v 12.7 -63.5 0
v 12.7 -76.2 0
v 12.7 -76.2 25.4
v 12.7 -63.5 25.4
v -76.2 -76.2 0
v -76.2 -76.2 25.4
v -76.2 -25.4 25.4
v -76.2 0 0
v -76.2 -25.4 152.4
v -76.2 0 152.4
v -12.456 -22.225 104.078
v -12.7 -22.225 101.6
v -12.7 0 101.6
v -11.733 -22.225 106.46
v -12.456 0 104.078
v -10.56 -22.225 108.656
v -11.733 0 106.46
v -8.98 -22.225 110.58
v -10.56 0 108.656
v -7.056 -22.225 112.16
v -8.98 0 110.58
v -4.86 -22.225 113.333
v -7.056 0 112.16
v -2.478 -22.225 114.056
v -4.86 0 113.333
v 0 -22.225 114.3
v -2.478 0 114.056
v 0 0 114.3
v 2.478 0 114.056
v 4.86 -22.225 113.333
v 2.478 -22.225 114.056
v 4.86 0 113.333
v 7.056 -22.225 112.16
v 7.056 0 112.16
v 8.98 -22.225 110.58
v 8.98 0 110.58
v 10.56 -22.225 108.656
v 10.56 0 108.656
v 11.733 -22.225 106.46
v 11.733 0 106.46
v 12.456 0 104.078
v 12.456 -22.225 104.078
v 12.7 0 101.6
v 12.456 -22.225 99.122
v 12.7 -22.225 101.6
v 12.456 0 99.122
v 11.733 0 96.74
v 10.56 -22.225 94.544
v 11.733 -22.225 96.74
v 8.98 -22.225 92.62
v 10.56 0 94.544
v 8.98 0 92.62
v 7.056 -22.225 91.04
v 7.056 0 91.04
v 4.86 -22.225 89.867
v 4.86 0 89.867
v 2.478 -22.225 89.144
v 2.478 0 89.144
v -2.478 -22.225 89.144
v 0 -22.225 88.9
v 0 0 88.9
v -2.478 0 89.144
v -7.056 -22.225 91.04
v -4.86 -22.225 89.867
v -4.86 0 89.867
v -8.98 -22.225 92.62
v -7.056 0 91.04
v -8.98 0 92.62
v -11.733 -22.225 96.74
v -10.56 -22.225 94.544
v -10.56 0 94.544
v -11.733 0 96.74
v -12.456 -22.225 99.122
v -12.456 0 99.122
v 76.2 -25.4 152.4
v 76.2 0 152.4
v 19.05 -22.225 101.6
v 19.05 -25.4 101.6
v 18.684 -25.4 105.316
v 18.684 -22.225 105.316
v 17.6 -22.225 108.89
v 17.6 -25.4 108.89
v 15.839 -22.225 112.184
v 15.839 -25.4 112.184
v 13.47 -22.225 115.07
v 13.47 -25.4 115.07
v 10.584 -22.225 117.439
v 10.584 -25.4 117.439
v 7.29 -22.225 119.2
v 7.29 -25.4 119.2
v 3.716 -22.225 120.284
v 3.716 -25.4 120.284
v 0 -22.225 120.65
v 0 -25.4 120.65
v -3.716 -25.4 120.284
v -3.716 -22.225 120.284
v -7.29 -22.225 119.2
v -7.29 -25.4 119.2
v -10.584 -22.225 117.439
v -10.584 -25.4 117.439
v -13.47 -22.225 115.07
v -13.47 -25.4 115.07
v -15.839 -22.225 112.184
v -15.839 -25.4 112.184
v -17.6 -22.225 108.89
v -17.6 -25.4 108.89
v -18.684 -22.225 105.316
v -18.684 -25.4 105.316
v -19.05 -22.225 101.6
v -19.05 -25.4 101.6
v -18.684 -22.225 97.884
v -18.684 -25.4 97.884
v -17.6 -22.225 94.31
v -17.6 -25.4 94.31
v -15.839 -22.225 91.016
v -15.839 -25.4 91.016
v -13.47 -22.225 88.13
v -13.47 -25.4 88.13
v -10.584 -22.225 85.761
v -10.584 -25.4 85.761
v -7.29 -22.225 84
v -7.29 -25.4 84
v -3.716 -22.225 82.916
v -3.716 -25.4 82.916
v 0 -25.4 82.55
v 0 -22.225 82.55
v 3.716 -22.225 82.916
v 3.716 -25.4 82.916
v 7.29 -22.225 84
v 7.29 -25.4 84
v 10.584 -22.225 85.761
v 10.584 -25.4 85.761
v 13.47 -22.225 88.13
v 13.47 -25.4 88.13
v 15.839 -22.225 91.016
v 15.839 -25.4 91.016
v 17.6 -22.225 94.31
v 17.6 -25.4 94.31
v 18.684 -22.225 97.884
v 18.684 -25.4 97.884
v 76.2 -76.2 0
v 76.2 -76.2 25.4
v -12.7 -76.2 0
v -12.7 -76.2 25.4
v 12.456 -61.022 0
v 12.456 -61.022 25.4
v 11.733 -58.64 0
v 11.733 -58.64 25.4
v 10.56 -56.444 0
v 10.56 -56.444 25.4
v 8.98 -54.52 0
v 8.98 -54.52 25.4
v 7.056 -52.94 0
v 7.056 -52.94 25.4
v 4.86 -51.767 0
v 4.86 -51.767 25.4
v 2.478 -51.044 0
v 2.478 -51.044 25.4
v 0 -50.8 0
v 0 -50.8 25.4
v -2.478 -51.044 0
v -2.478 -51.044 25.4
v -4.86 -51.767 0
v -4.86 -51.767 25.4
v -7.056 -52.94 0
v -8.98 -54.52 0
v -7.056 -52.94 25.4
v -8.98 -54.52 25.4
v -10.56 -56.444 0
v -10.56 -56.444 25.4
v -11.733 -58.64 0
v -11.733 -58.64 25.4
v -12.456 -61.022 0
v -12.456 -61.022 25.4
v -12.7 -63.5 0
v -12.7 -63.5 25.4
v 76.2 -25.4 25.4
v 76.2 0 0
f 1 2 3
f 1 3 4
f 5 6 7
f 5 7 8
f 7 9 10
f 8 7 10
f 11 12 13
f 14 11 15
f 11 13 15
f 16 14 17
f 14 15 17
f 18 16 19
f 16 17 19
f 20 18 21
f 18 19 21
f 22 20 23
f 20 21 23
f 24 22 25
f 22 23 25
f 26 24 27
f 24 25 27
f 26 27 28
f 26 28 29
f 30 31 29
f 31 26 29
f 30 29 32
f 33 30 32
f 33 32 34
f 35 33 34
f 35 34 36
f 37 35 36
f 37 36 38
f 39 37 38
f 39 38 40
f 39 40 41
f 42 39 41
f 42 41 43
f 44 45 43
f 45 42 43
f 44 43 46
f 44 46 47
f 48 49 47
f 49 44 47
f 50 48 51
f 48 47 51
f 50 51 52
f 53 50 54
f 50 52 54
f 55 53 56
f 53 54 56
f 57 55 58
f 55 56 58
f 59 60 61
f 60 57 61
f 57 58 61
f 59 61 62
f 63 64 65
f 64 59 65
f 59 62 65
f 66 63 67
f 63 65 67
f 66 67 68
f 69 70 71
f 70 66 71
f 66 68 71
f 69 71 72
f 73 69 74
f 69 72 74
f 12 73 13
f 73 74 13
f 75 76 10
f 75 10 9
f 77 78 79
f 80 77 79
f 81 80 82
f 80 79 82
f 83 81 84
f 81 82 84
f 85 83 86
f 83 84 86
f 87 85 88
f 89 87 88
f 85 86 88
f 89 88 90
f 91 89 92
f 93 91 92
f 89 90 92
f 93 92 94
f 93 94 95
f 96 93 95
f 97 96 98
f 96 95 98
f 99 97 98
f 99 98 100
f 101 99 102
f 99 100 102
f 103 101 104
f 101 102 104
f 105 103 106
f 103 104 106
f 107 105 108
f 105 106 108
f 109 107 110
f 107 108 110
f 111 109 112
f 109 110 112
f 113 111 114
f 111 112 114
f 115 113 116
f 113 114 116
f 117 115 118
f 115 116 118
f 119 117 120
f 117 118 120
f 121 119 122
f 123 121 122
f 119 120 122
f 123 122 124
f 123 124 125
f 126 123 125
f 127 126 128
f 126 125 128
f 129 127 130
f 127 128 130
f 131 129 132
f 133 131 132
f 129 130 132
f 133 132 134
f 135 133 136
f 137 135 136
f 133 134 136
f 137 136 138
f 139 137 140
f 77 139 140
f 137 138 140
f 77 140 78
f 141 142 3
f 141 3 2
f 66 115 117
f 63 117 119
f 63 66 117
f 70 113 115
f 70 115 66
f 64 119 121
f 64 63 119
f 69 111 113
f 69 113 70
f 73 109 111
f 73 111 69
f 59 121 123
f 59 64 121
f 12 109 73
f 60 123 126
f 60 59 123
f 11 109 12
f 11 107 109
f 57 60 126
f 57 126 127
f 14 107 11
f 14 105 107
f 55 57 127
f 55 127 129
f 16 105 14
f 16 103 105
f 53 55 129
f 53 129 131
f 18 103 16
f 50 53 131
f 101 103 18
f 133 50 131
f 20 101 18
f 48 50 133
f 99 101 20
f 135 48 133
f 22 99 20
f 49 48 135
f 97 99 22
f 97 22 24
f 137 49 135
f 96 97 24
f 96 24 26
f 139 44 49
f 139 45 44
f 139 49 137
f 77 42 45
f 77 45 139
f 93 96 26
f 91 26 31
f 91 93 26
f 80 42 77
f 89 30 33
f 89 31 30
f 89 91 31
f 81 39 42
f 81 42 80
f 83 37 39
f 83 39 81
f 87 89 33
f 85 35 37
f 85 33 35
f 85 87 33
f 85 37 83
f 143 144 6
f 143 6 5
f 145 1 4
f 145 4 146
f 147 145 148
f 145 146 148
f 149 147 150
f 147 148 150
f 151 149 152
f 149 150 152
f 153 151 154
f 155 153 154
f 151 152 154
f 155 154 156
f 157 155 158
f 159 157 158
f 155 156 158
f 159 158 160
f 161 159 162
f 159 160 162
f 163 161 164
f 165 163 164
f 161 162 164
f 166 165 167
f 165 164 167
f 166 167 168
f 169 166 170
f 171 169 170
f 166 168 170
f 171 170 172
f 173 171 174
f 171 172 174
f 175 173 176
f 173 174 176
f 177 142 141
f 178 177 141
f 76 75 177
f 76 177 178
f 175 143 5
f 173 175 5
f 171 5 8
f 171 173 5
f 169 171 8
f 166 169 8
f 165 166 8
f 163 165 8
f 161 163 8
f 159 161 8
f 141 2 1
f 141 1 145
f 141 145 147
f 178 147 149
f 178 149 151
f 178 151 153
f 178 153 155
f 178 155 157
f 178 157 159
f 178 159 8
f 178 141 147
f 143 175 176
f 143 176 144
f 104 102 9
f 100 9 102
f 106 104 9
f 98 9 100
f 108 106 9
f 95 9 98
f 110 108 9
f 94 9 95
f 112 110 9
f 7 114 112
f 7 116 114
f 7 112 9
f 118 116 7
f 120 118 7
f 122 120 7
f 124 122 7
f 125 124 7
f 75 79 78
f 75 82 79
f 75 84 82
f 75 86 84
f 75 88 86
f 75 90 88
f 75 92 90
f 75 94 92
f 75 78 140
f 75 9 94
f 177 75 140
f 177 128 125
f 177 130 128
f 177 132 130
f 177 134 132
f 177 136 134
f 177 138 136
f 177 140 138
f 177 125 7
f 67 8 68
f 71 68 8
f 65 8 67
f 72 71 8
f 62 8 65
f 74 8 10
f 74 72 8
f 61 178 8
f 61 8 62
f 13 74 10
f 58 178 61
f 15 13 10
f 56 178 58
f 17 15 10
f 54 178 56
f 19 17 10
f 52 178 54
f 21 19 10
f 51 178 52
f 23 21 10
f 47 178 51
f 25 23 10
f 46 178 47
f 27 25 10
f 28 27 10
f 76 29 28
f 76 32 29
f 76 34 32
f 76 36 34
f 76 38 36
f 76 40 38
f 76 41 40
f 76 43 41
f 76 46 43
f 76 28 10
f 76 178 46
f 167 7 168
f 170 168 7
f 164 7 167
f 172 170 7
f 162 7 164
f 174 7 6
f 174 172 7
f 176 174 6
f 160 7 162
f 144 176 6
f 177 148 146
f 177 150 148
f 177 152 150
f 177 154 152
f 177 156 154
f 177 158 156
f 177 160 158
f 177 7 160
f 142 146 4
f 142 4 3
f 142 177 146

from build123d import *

# Parameters (mm, degrees)
F1_DEPTH = 76.2
F2_R     = 12.7
F3_DEPTH = 76.201
F5_DEPTH = 25.401
F6_R     = 19.05
F6_R_2   = 12.7
F7_DEPTH = 3.175


with BuildPart() as f1:
    # F0 (on Right) → F1 (new body, symmetric)
    with BuildSketch(Plane.YZ):
        Polygon((-76.2, 0), (0, 0), (0, 152.4), (-25.4, 152.4), (-25.4, 25.4), (-76.2, 25.4), align=None)
    extrude(amount=F1_DEPTH, both=True)

    # F2 (on face) → F3 (cut, through all)
    with BuildSketch(Plane(origin=(0, 0, 0), x_dir=(-1, 0, 0), z_dir=(0, 1, 0))):
        with Locations((0, 101.6)):
            Circle(F2_R)
    extrude(amount=-F3_DEPTH, mode=Mode.SUBTRACT)

    # F4 (on face) → F5 (cut, through all)
    with BuildSketch(Plane.XY.offset(25.4)):
        with BuildLine():
            Line((-12.7, -63.5), (-12.7, -76.2))
            Line((-12.7, -76.2), (12.7, -76.2))
            Line((12.7, -76.2), (12.7, -63.5))
            ThreePointArc((12.7, -63.5), (0, -50.8), (-12.7, -63.5))
        make_face()
    extrude(amount=-F5_DEPTH, mode=Mode.SUBTRACT)

    # F6 (on face) → F7 (cut, symmetric)
    with BuildSketch(Plane.XZ.offset(25.4)):
        with Locations((0, 101.6)):
            Circle(F6_R)
        with Locations((0, 101.6)):
            Circle(F6_R_2, mode=Mode.SUBTRACT)
    extrude(amount=F7_DEPTH, both=True, mode=Mode.SUBTRACT)


solid = f1.part
